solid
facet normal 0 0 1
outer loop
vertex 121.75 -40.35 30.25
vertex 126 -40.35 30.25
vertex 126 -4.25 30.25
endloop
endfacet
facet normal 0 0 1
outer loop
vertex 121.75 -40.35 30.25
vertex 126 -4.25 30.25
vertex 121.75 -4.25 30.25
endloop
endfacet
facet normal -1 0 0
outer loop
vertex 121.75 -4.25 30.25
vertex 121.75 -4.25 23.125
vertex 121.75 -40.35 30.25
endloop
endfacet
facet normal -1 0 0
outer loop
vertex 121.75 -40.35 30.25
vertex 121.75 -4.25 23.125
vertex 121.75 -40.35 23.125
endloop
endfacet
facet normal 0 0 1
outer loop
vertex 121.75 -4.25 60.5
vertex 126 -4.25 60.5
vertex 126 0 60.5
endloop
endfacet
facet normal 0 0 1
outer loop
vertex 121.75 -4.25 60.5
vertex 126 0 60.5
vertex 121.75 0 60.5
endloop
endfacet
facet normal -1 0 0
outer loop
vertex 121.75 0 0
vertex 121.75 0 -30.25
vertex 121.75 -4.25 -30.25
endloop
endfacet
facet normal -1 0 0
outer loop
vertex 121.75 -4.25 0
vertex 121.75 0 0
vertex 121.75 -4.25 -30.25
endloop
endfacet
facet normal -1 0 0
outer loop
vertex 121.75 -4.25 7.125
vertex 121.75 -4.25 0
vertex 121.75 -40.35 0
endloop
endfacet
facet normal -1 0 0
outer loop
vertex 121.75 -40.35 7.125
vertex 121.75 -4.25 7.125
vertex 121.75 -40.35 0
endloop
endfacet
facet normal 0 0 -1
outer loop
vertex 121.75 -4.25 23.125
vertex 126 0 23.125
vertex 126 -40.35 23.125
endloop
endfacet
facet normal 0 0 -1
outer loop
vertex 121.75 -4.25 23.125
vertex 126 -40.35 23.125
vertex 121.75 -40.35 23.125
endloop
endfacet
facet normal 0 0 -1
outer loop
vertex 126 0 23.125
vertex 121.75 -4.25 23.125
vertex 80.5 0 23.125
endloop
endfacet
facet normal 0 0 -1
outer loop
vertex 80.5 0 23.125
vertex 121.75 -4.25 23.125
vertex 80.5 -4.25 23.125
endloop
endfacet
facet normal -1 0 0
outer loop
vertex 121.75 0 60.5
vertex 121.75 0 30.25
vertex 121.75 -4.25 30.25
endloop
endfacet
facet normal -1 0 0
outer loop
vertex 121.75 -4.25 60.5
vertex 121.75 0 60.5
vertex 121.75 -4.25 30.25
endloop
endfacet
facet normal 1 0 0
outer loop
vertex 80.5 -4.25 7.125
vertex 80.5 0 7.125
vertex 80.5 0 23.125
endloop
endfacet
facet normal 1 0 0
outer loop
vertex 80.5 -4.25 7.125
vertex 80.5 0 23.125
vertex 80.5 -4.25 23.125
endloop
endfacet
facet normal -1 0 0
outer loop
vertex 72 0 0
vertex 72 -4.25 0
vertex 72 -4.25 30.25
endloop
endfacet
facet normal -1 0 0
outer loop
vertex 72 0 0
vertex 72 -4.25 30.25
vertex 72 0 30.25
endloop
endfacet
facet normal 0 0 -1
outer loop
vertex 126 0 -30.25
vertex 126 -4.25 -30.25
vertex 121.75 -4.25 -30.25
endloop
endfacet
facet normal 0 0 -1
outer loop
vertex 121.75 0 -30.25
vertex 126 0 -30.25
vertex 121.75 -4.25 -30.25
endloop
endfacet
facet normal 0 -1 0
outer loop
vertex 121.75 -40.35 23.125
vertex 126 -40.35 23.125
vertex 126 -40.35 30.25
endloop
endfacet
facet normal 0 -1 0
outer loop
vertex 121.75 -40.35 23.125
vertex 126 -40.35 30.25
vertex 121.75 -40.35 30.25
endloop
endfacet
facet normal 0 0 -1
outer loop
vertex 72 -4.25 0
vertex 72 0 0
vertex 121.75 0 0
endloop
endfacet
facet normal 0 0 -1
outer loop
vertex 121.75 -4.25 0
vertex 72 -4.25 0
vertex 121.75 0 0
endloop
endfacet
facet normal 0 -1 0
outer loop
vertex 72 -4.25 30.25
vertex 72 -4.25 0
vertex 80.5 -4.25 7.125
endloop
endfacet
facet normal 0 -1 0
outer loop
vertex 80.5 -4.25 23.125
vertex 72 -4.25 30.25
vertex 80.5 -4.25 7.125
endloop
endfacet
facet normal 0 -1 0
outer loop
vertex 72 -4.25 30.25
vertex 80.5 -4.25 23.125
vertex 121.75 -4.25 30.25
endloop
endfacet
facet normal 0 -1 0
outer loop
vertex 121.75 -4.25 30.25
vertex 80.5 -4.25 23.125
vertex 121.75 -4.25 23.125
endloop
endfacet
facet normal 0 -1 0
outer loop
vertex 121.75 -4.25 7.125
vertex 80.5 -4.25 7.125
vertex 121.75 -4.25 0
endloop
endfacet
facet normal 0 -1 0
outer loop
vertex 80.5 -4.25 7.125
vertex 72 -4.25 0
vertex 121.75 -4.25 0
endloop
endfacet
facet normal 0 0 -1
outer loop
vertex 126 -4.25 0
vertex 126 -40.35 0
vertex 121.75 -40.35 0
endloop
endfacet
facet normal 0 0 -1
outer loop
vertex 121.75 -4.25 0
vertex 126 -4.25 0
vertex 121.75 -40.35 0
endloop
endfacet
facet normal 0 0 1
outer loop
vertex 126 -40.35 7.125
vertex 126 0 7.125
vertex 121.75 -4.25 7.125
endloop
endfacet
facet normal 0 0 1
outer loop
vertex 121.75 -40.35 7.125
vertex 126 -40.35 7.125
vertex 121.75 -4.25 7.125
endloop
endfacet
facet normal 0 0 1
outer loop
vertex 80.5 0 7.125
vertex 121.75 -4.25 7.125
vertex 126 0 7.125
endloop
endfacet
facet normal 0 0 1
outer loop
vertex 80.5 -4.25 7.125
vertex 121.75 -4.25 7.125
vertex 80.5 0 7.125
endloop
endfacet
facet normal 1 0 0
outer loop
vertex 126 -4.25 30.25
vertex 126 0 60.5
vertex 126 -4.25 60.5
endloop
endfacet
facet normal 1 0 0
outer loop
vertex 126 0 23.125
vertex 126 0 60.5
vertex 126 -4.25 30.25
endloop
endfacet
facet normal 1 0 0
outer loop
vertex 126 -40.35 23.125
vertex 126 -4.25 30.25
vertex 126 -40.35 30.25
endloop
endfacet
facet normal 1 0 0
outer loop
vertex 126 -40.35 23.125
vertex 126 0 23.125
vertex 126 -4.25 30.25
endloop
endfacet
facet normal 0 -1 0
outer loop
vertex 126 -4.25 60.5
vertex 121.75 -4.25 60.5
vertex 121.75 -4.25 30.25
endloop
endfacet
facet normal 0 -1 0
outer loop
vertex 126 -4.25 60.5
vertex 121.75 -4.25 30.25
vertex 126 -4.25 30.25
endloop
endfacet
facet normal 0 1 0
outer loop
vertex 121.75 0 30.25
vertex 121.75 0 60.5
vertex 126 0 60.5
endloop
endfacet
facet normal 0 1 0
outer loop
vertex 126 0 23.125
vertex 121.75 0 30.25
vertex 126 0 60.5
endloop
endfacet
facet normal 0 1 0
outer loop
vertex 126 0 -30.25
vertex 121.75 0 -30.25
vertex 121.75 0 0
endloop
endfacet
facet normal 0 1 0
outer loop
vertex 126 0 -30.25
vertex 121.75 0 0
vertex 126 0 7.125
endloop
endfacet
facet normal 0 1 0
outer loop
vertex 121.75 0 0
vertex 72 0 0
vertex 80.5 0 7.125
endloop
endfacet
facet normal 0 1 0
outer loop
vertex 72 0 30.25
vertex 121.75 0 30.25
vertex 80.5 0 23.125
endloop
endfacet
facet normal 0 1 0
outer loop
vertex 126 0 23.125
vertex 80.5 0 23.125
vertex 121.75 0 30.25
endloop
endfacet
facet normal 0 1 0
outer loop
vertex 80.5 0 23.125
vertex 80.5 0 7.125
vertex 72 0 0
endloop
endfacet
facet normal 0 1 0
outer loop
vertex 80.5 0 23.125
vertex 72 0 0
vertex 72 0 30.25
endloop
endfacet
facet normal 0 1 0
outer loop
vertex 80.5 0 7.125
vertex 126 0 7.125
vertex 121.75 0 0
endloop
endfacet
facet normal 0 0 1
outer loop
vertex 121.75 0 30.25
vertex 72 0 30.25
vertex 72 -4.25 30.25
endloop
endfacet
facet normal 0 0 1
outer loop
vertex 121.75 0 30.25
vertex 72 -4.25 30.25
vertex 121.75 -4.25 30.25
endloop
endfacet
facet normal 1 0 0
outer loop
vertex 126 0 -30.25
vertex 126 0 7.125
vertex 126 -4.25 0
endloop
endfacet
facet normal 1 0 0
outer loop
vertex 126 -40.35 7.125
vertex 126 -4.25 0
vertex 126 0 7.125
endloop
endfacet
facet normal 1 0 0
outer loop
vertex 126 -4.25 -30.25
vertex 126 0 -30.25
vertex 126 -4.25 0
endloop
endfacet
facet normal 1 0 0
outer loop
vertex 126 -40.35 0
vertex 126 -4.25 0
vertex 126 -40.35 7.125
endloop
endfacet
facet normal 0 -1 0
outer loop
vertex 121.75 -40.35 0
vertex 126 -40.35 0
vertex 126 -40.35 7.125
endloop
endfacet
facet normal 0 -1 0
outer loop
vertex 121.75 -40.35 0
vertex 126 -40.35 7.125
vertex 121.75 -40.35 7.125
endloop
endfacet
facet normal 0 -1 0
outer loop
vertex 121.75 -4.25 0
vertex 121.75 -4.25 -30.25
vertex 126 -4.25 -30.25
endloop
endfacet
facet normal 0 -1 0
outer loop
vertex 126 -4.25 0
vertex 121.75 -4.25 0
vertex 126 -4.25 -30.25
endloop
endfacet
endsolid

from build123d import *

# Parameters (mm, degrees)
BOX009_W     = 45.5
BOX009_H     = 44
BOX009_DEPTH = 16
BOX018_W     = 54
BOX018_H     = 4.25
BOX018_DEPTH = 30.25
BOX027_W     = 4.25
BOX027_H     = 4.25
BOX027_DEPTH = 90.75
BOX013_W     = 4.25
BOX013_H     = 36.1
BOX013_DEPTH = 30.25


with BuildPart() as cable_exclusion_zone:
    # Box009 → Box009 (new body)
    with BuildSketch(Plane(origin=(126, 0, 7.125), x_dir=(-1, 0, 0), z_dir=(0, 0, 1))):
        with Locations((22.75, 22)):
            Rectangle(BOX009_W, BOX009_H)
    extrude(amount=BOX009_DEPTH)


with BuildPart() as cube001:
    # Box018 → Box018 (new body)
    with BuildSketch(Plane(origin=(72, -4.25, 0), x_dir=(1, 0, 0), z_dir=(0, 0, 1))):
        with Locations((27, 2.125)):
            Rectangle(BOX018_W, BOX018_H)
    extrude(amount=BOX018_DEPTH)


with BuildPart() as base_support001:
    # Box027 → Box027 (new body)
    with BuildSketch(Plane(origin=(126, 0, -30.25), x_dir=(-1, 0, 0), z_dir=(0, 0, 1))):
        with Locations((2.125, 2.125)):
            Rectangle(BOX027_W, BOX027_H)
    extrude(amount=BOX027_DEPTH)


with BuildPart() as fusion005:
    # Fusion005 base: copy of base_support001
    add(base_support001.part)

    # Fusion005: union Cube001
    add(cube001.part)


with BuildPart() as base_support:
    # Box013 → Box013 (new body)
    with BuildSketch(Plane(origin=(126, -4.25, 0), x_dir=(-1, 0, 0), z_dir=(0, 0, 1))):
        with Locations((2.125, 18.05)):
            Rectangle(BOX013_W, BOX013_H)
    extrude(amount=BOX013_DEPTH)


with BuildPart() as cut004:
    # Fusion006 base: copy of base_support001
    add(base_support001.part)

    # Fusion006: union Cube001, Fusion005, base_support
    add(cube001.part)
    add(fusion005.part)
    add(base_support.part)

    # Cut004: cut cable_exclusion_zone
    add(cable_exclusion_zone.part, mode=Mode.SUBTRACT)


solid = cut004.part
